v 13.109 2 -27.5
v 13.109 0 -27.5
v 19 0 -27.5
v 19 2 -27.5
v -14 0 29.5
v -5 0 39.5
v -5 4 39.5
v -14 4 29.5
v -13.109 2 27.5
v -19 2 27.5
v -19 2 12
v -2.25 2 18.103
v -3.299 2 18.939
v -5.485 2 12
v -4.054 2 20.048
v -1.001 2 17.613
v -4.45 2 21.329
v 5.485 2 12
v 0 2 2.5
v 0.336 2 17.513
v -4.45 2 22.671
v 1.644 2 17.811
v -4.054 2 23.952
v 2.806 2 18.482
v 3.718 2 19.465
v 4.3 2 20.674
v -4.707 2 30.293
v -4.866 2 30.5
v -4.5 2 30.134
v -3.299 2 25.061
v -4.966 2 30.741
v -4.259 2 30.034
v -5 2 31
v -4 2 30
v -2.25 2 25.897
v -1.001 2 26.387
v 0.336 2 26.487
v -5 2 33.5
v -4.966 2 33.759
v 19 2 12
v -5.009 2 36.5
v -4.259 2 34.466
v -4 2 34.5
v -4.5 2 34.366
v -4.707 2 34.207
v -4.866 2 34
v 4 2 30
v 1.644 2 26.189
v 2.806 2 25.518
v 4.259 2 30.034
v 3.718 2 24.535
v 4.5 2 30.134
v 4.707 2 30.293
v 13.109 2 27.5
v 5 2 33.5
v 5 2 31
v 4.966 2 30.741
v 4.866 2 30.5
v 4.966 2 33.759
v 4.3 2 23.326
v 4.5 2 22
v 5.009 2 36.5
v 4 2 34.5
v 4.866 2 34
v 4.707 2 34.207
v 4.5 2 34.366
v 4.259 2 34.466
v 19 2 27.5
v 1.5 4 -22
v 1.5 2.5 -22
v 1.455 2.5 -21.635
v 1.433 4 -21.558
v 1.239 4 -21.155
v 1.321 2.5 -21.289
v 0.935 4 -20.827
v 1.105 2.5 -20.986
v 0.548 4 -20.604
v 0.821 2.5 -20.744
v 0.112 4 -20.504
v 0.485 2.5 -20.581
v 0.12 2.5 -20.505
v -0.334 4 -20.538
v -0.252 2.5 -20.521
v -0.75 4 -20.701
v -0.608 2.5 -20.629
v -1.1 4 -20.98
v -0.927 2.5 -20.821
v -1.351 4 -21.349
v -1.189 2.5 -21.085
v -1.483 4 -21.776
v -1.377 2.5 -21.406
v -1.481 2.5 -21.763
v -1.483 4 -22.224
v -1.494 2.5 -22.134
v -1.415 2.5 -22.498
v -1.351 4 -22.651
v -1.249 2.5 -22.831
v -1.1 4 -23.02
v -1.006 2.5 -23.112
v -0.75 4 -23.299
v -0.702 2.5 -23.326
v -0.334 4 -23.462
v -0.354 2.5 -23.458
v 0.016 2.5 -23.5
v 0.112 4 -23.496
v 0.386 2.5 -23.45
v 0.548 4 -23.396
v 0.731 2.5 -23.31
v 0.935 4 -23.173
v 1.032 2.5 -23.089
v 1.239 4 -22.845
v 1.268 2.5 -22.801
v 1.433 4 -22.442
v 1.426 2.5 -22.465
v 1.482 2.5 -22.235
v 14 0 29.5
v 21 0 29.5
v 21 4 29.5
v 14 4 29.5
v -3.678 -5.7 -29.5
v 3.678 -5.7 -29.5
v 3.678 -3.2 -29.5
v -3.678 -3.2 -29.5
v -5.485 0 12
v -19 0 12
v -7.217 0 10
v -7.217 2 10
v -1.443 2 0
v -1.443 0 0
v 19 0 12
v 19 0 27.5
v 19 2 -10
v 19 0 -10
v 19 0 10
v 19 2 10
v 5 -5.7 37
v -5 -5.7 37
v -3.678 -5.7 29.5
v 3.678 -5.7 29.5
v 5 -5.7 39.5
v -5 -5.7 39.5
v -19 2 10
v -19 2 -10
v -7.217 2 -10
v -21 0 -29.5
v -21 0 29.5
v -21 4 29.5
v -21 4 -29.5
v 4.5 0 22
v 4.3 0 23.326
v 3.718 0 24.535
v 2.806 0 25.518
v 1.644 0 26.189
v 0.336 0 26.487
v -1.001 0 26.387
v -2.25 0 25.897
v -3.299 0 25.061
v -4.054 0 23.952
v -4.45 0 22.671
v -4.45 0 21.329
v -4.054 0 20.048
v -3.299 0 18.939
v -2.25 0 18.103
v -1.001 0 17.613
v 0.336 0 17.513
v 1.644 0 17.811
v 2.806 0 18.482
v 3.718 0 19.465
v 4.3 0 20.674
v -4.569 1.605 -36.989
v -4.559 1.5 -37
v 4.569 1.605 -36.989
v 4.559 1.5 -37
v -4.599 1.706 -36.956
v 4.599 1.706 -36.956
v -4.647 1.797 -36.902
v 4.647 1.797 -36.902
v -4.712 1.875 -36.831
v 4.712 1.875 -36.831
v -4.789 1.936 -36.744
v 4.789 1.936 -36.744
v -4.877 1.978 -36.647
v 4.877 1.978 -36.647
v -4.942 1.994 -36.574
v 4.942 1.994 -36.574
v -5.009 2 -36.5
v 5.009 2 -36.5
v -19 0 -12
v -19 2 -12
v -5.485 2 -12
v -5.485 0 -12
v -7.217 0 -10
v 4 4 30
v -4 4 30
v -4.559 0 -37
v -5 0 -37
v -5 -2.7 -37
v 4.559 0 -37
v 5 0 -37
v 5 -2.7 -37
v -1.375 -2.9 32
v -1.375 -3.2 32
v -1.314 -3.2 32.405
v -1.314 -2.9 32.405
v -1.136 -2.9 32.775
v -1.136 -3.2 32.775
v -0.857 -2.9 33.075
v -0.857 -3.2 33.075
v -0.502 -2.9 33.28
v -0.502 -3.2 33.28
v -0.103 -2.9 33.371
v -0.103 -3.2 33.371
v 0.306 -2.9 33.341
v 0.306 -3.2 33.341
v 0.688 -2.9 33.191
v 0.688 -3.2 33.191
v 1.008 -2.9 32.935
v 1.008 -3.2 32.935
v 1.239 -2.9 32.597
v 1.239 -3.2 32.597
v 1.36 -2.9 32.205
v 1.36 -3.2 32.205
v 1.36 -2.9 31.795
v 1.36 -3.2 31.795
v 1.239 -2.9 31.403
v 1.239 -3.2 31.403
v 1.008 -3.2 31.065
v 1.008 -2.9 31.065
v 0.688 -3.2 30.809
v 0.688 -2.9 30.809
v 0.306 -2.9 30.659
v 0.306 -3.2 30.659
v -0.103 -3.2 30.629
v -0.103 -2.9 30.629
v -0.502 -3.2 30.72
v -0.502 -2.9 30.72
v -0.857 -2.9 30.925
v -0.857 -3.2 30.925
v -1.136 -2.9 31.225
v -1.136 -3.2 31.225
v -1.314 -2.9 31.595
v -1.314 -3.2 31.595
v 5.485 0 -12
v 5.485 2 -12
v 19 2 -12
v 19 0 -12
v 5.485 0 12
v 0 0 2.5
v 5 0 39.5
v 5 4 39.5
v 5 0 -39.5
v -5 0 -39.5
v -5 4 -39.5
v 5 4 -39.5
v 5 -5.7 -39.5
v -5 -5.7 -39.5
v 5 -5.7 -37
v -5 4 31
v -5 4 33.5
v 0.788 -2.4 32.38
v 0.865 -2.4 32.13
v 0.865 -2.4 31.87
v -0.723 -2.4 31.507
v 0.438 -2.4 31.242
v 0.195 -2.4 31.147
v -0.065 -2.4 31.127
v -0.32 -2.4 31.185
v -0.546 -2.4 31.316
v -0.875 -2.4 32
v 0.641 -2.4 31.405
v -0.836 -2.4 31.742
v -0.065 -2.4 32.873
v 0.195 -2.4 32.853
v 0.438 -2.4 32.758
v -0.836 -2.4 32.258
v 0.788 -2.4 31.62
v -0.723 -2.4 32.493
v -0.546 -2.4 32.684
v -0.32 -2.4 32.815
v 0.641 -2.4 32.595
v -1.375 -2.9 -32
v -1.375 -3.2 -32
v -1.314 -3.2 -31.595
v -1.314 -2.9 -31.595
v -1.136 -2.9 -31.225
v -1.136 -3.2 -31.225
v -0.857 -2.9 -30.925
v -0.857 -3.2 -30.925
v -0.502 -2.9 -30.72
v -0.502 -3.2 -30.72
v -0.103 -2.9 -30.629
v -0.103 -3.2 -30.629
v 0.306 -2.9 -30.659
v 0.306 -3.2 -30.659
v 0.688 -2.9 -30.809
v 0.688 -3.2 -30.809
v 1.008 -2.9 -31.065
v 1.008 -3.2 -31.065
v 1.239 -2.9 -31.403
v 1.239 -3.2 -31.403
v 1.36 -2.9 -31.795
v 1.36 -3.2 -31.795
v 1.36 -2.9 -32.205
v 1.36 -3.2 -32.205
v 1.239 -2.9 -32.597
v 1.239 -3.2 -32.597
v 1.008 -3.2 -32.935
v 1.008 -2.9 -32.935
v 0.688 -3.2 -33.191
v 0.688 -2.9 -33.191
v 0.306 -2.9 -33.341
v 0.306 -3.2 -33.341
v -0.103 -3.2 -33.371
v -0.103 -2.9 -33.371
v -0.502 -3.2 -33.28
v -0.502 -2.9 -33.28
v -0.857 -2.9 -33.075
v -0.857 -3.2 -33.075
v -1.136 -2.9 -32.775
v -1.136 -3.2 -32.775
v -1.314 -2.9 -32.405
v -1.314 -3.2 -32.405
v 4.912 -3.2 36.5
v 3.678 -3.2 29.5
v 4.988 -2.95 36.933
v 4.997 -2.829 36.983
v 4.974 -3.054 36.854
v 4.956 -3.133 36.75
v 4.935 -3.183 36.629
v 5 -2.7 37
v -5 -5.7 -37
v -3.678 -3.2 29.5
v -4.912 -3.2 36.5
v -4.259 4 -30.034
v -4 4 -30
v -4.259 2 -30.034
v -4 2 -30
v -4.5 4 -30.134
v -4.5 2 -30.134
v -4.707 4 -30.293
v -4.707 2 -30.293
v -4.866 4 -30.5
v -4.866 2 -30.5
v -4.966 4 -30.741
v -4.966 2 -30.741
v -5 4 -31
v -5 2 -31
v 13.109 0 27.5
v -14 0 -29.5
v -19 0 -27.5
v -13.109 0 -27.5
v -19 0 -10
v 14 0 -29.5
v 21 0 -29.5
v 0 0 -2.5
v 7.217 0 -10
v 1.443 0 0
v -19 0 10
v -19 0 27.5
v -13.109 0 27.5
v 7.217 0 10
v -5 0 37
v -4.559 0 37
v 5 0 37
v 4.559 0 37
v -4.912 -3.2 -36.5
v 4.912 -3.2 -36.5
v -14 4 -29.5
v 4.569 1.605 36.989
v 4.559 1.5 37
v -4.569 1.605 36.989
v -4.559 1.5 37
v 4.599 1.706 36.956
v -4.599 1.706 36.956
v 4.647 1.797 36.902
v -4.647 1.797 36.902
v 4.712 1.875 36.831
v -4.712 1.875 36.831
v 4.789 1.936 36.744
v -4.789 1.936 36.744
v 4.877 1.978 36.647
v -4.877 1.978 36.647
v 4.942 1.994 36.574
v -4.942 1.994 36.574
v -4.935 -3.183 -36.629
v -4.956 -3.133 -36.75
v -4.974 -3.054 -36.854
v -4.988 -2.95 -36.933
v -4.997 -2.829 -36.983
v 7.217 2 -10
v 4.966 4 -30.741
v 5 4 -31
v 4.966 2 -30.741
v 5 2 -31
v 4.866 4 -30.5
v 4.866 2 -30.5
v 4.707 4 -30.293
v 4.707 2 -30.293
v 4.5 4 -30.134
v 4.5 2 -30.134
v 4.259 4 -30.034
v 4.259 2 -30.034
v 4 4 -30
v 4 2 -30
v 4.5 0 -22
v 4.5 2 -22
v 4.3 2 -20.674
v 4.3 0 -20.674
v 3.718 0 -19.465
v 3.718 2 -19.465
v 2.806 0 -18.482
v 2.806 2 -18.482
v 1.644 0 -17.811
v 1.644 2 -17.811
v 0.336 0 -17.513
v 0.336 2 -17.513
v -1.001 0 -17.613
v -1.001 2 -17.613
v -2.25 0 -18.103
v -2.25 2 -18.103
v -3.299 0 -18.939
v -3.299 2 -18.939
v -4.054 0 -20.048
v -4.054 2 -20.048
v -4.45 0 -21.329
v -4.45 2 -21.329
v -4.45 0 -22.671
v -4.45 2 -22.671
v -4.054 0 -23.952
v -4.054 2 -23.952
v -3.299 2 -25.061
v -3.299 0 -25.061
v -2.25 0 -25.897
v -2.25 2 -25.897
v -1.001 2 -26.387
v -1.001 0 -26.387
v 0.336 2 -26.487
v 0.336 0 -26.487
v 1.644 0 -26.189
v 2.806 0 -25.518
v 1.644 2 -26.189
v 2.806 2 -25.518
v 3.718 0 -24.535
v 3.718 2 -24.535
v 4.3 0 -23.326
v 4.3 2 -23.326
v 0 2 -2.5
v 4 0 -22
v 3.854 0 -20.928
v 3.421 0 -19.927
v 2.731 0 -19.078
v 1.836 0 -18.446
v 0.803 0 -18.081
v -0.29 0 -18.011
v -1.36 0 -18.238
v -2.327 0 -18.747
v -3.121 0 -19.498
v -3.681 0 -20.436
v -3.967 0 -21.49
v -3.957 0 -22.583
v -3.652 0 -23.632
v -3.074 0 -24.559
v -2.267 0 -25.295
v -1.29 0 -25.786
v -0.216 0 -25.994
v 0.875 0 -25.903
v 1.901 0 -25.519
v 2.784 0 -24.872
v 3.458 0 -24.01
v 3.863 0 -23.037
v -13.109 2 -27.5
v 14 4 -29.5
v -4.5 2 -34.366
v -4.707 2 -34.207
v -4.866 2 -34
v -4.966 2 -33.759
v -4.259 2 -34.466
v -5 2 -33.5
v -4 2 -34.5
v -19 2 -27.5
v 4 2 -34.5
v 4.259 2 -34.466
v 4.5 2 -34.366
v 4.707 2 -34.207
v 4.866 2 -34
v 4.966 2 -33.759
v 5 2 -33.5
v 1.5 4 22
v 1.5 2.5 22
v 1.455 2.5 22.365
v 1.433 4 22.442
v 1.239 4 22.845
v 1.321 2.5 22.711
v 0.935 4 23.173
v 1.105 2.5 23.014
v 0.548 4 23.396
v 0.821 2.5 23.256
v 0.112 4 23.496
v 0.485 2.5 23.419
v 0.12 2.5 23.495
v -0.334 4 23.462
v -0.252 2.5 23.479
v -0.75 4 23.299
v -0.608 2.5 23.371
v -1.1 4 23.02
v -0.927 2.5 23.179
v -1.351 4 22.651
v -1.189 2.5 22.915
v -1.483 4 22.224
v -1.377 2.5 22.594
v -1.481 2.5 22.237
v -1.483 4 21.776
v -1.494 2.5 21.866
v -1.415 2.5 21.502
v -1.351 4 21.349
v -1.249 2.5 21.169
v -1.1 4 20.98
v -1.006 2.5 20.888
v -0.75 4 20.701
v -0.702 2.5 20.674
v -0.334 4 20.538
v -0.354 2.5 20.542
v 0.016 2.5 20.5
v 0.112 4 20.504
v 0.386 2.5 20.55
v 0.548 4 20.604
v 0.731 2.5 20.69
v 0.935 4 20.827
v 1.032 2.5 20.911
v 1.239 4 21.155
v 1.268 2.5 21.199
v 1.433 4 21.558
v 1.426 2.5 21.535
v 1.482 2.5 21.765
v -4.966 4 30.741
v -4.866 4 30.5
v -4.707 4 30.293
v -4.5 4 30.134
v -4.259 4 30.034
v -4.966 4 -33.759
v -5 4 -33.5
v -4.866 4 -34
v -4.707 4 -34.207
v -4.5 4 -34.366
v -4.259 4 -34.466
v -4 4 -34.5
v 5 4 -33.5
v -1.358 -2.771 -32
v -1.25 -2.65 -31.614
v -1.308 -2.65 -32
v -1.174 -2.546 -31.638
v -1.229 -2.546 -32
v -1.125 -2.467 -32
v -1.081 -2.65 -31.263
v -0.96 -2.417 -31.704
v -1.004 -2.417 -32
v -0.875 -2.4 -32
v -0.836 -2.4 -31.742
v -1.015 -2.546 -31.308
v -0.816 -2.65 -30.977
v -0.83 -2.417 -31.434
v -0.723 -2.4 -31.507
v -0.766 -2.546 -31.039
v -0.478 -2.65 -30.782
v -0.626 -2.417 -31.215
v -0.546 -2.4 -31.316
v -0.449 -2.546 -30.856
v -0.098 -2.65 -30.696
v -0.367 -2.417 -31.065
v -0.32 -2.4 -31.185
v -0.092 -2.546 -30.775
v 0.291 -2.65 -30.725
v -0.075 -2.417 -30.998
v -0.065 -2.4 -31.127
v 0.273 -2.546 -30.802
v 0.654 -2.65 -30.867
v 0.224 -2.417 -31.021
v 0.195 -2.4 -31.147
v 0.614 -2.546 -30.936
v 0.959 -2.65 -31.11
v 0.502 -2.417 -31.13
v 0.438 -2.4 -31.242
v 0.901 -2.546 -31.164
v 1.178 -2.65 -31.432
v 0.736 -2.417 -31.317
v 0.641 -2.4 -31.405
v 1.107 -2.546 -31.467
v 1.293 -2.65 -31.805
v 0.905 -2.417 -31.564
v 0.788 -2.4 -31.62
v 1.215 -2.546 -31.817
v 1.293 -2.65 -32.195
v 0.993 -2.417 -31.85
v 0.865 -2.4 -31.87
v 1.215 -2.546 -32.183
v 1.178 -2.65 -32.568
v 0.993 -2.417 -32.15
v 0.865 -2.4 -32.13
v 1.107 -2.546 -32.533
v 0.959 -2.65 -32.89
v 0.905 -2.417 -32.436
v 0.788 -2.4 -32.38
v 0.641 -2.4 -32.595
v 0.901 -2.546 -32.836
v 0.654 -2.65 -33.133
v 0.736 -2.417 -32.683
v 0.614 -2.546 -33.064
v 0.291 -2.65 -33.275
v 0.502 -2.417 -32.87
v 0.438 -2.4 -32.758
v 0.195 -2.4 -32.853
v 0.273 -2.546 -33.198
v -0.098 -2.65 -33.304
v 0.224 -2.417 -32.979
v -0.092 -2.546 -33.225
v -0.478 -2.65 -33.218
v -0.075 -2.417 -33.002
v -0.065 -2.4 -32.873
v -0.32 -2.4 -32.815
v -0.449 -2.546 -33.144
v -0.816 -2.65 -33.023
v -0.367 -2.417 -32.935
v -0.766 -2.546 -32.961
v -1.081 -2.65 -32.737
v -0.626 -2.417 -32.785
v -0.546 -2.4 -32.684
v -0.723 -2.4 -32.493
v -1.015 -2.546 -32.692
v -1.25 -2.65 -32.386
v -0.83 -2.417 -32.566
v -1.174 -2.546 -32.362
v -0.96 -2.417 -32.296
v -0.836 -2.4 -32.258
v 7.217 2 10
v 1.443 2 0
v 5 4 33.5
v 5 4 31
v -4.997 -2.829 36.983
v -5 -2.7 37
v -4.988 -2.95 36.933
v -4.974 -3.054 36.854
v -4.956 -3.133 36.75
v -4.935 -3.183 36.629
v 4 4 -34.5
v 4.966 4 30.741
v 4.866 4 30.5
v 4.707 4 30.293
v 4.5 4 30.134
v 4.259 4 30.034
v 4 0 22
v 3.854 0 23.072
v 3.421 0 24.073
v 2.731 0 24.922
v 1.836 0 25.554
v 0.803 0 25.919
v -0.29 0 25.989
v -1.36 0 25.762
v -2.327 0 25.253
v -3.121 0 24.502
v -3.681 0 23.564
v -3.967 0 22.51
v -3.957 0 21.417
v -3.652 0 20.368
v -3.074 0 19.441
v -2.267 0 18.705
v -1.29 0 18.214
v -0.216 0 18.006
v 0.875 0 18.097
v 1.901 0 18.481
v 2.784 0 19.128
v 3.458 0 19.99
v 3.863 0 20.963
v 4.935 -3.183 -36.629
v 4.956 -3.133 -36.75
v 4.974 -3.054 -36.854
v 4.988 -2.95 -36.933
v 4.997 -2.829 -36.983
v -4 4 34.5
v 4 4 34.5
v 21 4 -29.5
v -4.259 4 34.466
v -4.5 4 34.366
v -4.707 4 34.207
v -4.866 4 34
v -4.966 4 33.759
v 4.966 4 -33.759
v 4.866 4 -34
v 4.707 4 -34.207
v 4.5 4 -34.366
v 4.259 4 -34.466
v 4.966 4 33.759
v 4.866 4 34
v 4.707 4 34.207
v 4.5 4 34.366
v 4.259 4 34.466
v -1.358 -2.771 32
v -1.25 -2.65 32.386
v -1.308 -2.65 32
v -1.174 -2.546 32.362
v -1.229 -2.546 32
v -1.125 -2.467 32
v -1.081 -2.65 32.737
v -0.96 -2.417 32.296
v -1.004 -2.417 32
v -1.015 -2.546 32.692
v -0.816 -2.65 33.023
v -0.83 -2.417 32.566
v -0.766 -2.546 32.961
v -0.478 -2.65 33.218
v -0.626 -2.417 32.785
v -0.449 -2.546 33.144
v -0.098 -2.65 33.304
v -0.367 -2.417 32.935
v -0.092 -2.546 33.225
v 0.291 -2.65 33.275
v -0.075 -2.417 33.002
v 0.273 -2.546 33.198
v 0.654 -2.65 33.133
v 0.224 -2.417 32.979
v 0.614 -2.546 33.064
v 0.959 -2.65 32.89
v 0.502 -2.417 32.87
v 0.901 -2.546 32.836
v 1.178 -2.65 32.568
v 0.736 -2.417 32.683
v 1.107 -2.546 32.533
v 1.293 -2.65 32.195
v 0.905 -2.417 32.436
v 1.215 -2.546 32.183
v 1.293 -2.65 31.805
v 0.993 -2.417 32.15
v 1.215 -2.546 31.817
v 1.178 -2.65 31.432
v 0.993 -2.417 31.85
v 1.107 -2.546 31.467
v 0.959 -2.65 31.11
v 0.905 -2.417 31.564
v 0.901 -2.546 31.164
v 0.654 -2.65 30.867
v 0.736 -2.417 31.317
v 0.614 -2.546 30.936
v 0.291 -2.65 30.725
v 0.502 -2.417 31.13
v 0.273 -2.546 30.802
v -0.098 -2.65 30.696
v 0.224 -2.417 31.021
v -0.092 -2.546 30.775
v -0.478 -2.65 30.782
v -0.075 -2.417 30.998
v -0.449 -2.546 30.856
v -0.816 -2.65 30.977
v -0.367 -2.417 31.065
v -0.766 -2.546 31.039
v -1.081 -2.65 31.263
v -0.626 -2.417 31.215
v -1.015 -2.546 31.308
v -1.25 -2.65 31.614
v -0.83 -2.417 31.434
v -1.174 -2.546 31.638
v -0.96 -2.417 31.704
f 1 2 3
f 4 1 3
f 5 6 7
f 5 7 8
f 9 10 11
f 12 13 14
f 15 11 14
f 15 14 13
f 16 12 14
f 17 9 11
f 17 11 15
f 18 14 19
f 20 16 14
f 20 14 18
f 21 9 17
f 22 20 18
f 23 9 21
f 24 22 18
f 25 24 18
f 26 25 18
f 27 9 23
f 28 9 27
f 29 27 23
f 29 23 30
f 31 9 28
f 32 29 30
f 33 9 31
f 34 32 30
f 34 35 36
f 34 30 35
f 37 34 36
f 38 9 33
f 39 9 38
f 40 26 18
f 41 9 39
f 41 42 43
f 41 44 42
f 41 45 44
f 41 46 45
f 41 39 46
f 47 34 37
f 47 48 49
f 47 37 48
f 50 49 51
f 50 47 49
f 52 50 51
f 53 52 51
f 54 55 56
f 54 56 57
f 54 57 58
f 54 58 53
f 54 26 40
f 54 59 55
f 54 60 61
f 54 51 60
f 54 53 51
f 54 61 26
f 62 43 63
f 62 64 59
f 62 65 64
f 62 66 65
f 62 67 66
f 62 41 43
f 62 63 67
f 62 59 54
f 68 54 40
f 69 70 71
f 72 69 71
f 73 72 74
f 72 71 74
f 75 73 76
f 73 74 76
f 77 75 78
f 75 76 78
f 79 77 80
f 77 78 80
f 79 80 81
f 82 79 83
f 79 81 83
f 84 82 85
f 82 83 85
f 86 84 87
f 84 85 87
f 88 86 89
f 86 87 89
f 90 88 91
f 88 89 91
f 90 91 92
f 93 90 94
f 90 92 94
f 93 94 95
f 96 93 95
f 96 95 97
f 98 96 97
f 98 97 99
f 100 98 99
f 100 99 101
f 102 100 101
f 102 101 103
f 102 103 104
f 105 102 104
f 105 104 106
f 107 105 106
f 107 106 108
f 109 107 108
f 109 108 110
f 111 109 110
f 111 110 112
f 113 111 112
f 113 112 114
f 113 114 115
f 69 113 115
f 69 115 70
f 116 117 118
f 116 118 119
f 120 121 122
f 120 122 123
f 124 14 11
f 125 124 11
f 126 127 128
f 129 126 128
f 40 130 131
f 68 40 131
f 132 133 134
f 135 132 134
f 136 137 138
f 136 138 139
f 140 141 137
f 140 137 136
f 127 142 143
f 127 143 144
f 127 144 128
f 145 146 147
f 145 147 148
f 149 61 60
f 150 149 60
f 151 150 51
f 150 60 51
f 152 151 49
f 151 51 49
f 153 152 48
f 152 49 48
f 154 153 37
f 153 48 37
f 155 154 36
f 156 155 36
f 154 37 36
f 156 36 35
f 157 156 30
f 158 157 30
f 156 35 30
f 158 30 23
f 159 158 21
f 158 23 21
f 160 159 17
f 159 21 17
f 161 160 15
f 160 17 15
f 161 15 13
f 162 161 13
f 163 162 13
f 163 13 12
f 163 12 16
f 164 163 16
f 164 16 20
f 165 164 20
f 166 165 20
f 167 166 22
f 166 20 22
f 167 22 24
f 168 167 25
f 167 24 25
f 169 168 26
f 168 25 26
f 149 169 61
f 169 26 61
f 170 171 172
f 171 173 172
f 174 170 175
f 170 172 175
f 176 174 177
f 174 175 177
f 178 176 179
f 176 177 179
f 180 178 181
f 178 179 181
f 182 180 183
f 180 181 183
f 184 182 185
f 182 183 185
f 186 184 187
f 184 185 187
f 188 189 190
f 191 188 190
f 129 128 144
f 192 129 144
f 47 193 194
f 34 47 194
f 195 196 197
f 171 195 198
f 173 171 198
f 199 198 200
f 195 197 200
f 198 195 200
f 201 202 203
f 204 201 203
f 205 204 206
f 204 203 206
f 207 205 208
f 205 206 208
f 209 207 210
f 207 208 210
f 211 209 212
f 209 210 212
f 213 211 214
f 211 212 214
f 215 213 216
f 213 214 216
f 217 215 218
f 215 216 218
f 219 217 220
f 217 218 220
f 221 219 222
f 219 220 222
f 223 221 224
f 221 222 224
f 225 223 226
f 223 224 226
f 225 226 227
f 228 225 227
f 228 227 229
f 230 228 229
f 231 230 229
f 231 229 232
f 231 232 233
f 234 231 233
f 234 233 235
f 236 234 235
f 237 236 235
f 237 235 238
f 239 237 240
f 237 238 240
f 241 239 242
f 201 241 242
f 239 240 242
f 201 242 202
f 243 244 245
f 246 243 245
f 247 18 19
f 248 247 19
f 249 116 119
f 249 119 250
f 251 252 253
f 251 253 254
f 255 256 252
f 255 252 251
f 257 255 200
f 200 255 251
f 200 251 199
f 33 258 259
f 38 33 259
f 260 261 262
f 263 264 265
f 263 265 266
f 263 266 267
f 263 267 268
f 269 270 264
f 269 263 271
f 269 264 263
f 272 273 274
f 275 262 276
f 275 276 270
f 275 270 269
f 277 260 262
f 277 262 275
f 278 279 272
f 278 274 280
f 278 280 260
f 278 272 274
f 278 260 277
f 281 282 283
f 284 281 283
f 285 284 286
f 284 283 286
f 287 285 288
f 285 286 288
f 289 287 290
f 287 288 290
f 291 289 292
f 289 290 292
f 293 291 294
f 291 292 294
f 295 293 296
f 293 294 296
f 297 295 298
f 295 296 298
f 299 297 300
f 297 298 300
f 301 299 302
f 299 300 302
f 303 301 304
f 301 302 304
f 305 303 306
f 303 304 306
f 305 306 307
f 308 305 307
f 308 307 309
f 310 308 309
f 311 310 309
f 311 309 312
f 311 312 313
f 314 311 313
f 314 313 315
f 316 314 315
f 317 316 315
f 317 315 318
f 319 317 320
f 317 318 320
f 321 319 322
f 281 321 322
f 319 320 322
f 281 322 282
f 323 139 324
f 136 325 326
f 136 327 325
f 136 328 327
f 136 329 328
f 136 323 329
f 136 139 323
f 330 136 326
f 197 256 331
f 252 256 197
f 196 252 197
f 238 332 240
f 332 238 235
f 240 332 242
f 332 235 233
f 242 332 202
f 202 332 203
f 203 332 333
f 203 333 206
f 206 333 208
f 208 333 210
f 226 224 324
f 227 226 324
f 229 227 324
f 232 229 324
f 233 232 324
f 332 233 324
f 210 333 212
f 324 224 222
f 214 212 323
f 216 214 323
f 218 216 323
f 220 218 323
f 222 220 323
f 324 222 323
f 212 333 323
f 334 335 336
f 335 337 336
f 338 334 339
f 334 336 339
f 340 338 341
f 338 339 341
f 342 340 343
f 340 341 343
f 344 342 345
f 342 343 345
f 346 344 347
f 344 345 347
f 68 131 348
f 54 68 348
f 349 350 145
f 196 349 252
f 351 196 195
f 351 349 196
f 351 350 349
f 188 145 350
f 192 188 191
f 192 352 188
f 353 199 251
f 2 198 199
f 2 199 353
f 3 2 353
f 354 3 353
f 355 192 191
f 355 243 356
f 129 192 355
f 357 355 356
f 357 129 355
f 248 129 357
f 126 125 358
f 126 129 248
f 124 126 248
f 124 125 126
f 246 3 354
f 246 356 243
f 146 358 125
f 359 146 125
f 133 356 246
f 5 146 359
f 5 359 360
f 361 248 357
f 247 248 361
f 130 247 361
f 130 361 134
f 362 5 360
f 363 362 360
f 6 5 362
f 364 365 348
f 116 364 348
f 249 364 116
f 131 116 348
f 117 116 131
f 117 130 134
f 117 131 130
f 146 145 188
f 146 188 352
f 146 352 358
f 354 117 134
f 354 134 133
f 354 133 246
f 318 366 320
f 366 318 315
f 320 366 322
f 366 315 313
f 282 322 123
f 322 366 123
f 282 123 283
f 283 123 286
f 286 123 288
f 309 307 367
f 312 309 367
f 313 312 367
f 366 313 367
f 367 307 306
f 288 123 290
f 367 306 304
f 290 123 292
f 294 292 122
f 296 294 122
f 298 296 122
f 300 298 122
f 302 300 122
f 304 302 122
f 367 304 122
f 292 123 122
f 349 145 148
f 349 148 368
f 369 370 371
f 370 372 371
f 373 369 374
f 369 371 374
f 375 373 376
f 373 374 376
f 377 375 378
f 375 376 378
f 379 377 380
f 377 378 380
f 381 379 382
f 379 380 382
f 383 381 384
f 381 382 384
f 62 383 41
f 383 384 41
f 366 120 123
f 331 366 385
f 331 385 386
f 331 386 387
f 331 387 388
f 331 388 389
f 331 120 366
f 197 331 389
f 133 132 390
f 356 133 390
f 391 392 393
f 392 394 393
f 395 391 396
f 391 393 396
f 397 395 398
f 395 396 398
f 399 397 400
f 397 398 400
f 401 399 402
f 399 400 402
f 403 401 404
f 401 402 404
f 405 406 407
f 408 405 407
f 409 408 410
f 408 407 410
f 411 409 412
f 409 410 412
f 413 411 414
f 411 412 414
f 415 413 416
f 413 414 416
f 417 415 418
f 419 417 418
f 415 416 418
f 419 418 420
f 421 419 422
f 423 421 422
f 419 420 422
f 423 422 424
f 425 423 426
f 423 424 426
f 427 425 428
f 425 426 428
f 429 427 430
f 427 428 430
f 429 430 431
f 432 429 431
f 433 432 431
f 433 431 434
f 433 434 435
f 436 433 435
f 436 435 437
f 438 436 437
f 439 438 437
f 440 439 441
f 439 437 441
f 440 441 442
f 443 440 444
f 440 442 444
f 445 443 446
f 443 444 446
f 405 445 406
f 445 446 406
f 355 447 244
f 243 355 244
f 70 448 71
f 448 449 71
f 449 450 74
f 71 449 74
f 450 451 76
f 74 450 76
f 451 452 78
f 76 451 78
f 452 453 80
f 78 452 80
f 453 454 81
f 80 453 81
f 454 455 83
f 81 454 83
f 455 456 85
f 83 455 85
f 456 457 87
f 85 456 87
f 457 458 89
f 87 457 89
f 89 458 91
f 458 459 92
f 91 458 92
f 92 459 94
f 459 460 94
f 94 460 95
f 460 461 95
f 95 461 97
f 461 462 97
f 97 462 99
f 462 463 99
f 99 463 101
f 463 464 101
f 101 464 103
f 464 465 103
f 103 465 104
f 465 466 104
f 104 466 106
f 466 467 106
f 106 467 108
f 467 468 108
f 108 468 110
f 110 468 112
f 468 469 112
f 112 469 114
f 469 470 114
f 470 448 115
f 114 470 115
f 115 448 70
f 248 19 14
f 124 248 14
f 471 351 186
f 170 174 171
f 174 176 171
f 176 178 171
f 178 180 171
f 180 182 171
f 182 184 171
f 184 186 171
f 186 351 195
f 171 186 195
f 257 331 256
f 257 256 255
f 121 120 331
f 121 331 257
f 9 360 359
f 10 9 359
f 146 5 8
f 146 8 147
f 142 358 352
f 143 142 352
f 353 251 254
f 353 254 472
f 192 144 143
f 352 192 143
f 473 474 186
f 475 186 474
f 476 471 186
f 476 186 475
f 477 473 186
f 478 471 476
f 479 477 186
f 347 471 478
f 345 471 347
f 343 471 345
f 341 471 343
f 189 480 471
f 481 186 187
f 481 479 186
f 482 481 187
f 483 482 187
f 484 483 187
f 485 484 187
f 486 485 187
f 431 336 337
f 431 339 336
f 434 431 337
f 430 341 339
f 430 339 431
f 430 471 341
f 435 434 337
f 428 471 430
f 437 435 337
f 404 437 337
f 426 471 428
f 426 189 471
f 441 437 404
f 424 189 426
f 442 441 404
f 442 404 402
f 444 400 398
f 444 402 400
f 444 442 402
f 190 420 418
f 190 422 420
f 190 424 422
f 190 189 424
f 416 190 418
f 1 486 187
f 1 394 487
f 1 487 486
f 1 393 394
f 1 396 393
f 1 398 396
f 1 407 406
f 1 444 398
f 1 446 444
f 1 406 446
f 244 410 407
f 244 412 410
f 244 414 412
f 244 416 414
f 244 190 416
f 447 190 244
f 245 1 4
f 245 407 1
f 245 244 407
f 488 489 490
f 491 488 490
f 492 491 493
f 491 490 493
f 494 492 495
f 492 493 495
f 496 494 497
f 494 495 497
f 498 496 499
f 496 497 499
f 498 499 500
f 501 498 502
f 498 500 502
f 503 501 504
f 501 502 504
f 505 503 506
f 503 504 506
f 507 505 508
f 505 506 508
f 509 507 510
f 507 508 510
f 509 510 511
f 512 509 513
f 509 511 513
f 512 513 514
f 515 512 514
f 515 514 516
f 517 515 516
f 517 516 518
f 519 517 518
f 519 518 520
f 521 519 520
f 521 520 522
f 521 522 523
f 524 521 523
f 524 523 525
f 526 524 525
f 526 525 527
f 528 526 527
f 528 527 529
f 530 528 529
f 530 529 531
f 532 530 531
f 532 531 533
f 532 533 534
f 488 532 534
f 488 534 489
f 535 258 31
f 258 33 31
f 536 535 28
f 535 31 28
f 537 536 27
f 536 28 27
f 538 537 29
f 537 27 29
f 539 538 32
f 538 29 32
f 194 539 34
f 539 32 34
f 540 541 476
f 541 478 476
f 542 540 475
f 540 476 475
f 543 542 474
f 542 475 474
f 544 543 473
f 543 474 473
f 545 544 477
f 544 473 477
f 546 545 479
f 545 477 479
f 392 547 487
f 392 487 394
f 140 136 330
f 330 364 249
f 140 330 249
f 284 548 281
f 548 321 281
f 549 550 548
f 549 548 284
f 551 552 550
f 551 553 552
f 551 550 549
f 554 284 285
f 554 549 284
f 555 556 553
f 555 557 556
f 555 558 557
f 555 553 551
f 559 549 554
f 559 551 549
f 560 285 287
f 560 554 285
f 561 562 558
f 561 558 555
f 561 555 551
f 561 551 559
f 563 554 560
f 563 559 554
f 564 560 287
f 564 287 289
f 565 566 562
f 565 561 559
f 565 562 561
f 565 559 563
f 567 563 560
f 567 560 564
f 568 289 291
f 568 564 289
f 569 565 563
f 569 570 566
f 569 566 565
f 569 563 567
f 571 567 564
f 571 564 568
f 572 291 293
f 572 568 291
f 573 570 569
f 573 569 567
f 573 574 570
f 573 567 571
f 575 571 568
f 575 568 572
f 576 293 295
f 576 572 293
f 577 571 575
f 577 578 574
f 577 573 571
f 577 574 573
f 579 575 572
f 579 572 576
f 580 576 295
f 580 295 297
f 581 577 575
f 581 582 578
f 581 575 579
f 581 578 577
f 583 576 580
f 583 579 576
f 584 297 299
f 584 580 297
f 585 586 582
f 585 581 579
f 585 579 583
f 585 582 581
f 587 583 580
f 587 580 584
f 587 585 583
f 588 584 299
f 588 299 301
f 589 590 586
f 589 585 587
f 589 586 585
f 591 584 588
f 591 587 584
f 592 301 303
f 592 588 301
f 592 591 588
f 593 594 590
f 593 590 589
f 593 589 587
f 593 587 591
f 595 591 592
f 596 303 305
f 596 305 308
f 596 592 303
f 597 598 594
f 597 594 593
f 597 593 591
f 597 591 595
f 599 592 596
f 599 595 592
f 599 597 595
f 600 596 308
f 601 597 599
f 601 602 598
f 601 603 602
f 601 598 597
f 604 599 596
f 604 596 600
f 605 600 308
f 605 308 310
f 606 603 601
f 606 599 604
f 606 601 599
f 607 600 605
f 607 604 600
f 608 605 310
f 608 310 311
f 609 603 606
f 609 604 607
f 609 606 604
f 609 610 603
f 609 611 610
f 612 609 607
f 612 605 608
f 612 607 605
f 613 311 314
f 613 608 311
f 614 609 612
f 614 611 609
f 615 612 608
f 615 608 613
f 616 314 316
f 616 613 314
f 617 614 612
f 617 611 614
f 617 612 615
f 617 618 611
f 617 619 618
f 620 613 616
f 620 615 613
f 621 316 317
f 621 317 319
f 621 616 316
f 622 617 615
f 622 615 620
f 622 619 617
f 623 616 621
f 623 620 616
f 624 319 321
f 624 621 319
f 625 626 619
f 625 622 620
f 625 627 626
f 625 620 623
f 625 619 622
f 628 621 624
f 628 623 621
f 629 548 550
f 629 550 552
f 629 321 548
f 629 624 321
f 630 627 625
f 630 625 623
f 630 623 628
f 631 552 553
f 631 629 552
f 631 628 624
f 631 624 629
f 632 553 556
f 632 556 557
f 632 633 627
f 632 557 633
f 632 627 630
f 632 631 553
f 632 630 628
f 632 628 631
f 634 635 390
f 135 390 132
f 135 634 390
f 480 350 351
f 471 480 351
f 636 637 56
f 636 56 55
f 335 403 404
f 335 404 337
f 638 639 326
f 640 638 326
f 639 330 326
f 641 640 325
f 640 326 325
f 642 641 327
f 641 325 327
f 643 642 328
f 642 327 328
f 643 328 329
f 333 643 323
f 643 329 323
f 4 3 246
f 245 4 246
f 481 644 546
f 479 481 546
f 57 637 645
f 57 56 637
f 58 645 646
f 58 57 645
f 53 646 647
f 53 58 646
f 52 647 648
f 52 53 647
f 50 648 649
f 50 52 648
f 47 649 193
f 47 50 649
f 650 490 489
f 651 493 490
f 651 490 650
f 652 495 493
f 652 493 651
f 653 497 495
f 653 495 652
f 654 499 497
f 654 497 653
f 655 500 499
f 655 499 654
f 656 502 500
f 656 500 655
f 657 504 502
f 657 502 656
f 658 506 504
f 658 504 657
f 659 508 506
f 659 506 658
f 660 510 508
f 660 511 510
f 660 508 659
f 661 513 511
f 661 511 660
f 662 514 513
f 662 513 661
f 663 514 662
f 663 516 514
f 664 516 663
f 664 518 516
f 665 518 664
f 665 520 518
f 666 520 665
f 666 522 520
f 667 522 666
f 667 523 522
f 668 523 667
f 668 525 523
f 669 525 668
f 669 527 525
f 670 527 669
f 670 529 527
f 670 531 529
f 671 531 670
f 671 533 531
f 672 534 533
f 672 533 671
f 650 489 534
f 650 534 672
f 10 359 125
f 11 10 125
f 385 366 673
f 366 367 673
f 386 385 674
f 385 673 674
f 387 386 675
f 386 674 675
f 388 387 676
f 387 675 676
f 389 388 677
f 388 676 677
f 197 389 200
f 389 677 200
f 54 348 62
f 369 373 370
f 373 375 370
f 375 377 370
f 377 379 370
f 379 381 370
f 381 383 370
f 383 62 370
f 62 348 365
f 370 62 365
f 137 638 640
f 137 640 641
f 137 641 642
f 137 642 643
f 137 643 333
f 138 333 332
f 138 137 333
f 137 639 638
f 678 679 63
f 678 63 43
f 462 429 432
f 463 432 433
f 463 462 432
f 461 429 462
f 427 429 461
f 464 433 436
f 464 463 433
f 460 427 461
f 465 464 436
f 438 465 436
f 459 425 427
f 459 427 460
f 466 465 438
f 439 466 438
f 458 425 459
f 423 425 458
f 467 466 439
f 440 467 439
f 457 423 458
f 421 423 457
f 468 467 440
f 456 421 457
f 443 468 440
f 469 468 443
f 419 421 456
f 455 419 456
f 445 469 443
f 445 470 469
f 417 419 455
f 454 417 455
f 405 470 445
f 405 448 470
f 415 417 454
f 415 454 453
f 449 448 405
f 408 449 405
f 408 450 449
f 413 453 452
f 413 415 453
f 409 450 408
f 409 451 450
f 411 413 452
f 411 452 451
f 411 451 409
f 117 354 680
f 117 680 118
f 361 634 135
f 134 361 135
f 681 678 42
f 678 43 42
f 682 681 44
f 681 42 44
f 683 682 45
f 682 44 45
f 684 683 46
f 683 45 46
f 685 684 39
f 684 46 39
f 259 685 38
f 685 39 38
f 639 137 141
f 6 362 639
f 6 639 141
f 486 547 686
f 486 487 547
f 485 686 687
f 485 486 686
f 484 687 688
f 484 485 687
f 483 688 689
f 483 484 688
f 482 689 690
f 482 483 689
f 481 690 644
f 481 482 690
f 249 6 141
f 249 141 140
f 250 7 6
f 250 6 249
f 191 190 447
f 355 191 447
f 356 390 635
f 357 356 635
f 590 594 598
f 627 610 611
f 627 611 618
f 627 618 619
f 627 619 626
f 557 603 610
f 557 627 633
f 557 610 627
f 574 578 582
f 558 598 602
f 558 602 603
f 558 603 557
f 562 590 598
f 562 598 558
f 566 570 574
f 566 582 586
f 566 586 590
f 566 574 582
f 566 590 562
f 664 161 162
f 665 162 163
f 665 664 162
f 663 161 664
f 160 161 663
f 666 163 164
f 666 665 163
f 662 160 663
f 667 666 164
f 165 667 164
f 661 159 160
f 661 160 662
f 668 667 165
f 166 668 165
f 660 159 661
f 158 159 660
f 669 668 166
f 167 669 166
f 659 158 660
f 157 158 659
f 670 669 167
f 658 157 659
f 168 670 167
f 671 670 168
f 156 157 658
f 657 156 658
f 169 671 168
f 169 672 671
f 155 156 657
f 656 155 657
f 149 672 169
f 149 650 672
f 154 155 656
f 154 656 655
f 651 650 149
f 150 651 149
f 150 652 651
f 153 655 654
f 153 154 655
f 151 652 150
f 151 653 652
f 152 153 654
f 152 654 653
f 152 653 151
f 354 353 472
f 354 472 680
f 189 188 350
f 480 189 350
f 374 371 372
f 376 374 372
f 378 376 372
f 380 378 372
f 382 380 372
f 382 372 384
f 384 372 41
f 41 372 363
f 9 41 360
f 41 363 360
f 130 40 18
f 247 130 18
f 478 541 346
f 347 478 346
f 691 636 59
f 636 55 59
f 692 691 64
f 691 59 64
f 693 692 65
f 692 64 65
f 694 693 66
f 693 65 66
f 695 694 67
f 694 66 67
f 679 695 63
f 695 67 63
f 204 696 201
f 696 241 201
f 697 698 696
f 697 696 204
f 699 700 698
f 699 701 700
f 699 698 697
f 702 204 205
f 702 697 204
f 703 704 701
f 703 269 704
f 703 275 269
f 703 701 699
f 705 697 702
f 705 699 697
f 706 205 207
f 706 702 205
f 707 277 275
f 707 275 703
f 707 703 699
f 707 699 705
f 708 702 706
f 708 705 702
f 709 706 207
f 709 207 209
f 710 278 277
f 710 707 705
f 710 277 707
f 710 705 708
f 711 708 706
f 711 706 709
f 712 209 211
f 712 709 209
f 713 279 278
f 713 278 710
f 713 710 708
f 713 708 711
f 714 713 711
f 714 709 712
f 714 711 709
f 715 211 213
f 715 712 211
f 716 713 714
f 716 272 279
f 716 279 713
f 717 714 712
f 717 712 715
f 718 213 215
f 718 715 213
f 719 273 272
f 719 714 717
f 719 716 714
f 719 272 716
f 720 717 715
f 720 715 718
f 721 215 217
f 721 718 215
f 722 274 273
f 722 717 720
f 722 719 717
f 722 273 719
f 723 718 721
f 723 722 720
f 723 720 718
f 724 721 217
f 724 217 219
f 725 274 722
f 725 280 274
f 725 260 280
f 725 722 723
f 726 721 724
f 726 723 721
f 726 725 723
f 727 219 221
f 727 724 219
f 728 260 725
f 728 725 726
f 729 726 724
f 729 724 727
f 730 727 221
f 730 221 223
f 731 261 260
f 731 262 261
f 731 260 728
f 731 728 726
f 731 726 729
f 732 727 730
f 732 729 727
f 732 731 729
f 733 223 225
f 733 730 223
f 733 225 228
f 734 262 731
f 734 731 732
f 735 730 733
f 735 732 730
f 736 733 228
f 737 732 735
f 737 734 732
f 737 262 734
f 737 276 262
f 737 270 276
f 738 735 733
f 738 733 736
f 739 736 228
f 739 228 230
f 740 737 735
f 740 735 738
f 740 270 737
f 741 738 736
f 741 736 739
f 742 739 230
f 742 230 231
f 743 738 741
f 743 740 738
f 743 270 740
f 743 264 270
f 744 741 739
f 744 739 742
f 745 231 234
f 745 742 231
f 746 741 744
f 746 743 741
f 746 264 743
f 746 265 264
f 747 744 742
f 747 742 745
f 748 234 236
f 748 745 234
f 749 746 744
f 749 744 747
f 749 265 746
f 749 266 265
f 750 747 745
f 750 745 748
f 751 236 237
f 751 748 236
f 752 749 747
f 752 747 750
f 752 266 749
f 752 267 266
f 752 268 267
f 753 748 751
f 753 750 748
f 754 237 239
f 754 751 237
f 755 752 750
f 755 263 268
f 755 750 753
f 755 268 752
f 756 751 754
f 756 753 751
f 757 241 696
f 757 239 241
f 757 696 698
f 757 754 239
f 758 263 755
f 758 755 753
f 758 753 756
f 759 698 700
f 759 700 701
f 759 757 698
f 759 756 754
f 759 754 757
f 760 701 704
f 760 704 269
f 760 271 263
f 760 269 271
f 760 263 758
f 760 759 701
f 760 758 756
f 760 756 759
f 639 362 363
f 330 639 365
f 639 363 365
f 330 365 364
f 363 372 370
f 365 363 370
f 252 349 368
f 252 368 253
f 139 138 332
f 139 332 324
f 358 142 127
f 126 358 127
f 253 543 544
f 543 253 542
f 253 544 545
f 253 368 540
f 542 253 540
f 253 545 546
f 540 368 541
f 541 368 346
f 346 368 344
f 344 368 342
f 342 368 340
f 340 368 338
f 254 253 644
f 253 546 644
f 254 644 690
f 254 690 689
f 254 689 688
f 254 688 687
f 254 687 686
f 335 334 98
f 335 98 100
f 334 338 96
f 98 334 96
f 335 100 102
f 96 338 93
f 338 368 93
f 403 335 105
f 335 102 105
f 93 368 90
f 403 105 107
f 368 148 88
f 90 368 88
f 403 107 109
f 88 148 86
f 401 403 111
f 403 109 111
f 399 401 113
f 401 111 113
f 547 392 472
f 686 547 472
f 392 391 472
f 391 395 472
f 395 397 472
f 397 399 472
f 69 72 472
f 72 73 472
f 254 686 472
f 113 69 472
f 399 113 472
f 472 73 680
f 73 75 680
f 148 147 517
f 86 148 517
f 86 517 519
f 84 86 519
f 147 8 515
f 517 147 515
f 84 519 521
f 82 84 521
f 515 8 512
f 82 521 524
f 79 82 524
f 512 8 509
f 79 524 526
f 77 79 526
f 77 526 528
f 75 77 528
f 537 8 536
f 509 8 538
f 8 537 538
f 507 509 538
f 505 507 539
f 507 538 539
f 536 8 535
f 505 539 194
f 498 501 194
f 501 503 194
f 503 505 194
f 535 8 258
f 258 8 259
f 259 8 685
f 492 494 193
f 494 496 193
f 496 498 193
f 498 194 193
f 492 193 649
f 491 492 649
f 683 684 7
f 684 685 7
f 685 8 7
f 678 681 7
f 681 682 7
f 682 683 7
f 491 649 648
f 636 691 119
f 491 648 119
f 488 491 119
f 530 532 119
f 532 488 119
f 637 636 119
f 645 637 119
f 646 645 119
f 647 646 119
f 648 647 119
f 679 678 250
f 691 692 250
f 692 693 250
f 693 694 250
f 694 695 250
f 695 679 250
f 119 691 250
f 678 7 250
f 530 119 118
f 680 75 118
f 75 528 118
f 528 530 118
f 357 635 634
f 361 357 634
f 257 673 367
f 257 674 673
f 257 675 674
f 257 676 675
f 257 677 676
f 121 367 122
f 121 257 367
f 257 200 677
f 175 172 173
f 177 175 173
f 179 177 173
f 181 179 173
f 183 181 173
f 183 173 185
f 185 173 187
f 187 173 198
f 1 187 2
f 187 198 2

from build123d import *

# Parameters (mm, degrees)
F1_DEPTH  = 4
F2_W      = 10
F2_H      = 2.5
F3_DEPTH  = 5.7
F5_DEPTH  = 2.5
F6_R      = 1.5
F7_DEPTH  = 4
F9_DEPTH  = 2
F10_R     = 4.5
F10_R_2   = 1.5
F11_DEPTH = 2
F13_DEPTH = 2
F15_DEPTH = 2
F16_R     = 1.375
F17_DEPTH = 0.8
F18_SIZE  = 2.5
F19_W     = 10
F19_H     = 4.5
F20_DEPTH = 2
F21_R     = 1
F22_R     = 0.5
F23_R     = 0.5


with BuildPart() as f1:
    # F0 (on Front) → F1 (new body)
    with BuildSketch(Plane.XZ):
        Polygon((-14, 29.5), (-21, 29.5), (-21, -29.5), (-14, -29.5), (-5, -39.5), (5, -39.5), (14, -29.5), (21, -29.5), (21, 29.5), (14, 29.5), (5, 39.5), (-5, 39.5), align=None)
    extrude(amount=-F1_DEPTH)

    # F2 (on face) → F3 (join)
    with BuildSketch(Plane.XZ):
        with Locations((0, 38.25)):
            Rectangle(F2_W, F2_H)
        with Locations((0, -38.25)):
            Rectangle(F2_W, F2_H)
    extrude(amount=F3_DEPTH)

    # F4 (on face) → F5 (join)
    with BuildSketch(Plane.XZ.offset(5.7)):
        Polygon((5, 39.5), (-5, 39.5), (-5, 37), (-3.677548, 29.5), (3.677548, 29.5), (5, 37), align=None)
        Polygon((3.677548, -29.5), (-3.677548, -29.5), (-5, -37), (-5, -39.5), (5, -39.5), (5, -37), align=None)
    extrude(amount=-F5_DEPTH)

    # F6 (on face) → F7 (cut, through all)
    with BuildSketch(Plane.XZ):
        with Locations((0, 22)):
            Circle(F6_R)
        with Locations((0, -22)):
            Circle(F6_R)
    extrude(amount=-F7_DEPTH, mode=Mode.SUBTRACT)

    # F8 (on face) → F9 (cut)
    with BuildSketch(Plane.XZ):
        Polygon((-19, -27.5), (-13.109275, -27.5), (-6.359275, -35), (6.359275, -35), (13.109275, -27.5), (19, -27.5), (19, 27.5), (13.109275, 27.5), (6.359275, 35), (-6.359275, 35), (-13.109275, 27.5), (-19, 27.5), align=None)
    extrude(amount=-F9_DEPTH, mode=Mode.SUBTRACT)

    # F10 (on face) → F11 (join, through all)
    with BuildSketch(Plane.XZ.offset(-2)):
        with Locations((0, -22)):
            Circle(F10_R)
        with Locations((0, -22)):
            Circle(F10_R_2, mode=Mode.SUBTRACT)
        with Locations((0, 22)):
            Circle(F10_R)
        with Locations((0, 22)):
            Circle(F10_R_2, mode=Mode.SUBTRACT)
    extrude(amount=F11_DEPTH)

    # F12 (on face) → F13 (cut, through all)
    with BuildSketch(Plane.XZ):
        Polygon((-4.559275, -37), (4.559275, -37), (6.359275, -35), (5, -35), (-5, -35), (-6.359275, -35), align=None)
        Polygon((4.559275, 37), (-4.559275, 37), (-6.359275, 35), (6.359275, 35), align=None)
    extrude(amount=-F13_DEPTH, mode=Mode.SUBTRACT)

    # F14 (on face) → F15 (join, through all)
    with BuildSketch(Plane.XZ.offset(-2)):
        Polygon((5.484828, -12), (19, -12), (19, -10), (7.216878, -10), (1.443376, 0), (7.216878, 10), (19, 10), (19, 12), (5.484828, 12), (0, 2.5), (-5.484828, 12), (-19, 12), (-19, 10), (-7.216878, 10), (-1.443376, 0), (-7.216878, -10), (-19, -10), (-19, -12), (-5.484828, -12), (0, -2.5), align=None)
    extrude(amount=F15_DEPTH)

    # F16 (on face) → F17 (join)
    with BuildSketch(Plane(origin=(0, -3.2, 0), x_dir=(-1, 0, 0), z_dir=(0, 1, 0))):
        with Locations((0, -32)):
            Circle(F16_R)
        with Locations((0, 32)):
            Circle(F16_R)
    extrude(amount=F17_DEPTH)

    # F18
    f18_edges = [f1.edges().sort_by_distance(p)[0] for p in [
        (-1.5, 0, -22),
        (-1.5, 0, 22),
    ]]
    chamfer(f18_edges, length=F18_SIZE)

    # F19 (on face) → F20 (cut, through all)
    with BuildSketch(Plane(origin=(0, 4, 0), x_dir=(-1, 0, 0), z_dir=(0, 1, 0))):
        with Locations((0, 32.25)):
            Rectangle(F19_W, F19_H)
        with Locations((0, -32.25)):
            Rectangle(F19_W, F19_H)
    extrude(amount=-F20_DEPTH, mode=Mode.SUBTRACT)

    # F21
    f21_edges = [f1.edges().sort_by_distance(p)[0] for p in [
        (-5, 3, 34.5),
        (5, 3, 30),
        (5, 3, 34.5),
        (-5, 3, 30),
        (5, 3, -34.5),
        (5, 3, -30),
        (-5, 3, -30),
        (-5, 3, -34.5),
    ]]
    fillet(f21_edges, radius=F21_R)

    # F22
    f22_edges = [f1.edges().sort_by_distance(p)[0] for p in [
        (1.375, -2.4, -32),
        (1.375, -2.4, 32),
    ]]
    fillet(f22_edges, radius=F22_R)

    # F23
    f23_edges = [f1.edges().sort_by_distance(p)[0] for p in [
        (0, 2, 37),
        (0, 2, -37),
        (0, -3.2, 37),
        (0, -3.2, -37),
    ]]
    fillet(f23_edges, radius=F23_R)


solid = f1.part
